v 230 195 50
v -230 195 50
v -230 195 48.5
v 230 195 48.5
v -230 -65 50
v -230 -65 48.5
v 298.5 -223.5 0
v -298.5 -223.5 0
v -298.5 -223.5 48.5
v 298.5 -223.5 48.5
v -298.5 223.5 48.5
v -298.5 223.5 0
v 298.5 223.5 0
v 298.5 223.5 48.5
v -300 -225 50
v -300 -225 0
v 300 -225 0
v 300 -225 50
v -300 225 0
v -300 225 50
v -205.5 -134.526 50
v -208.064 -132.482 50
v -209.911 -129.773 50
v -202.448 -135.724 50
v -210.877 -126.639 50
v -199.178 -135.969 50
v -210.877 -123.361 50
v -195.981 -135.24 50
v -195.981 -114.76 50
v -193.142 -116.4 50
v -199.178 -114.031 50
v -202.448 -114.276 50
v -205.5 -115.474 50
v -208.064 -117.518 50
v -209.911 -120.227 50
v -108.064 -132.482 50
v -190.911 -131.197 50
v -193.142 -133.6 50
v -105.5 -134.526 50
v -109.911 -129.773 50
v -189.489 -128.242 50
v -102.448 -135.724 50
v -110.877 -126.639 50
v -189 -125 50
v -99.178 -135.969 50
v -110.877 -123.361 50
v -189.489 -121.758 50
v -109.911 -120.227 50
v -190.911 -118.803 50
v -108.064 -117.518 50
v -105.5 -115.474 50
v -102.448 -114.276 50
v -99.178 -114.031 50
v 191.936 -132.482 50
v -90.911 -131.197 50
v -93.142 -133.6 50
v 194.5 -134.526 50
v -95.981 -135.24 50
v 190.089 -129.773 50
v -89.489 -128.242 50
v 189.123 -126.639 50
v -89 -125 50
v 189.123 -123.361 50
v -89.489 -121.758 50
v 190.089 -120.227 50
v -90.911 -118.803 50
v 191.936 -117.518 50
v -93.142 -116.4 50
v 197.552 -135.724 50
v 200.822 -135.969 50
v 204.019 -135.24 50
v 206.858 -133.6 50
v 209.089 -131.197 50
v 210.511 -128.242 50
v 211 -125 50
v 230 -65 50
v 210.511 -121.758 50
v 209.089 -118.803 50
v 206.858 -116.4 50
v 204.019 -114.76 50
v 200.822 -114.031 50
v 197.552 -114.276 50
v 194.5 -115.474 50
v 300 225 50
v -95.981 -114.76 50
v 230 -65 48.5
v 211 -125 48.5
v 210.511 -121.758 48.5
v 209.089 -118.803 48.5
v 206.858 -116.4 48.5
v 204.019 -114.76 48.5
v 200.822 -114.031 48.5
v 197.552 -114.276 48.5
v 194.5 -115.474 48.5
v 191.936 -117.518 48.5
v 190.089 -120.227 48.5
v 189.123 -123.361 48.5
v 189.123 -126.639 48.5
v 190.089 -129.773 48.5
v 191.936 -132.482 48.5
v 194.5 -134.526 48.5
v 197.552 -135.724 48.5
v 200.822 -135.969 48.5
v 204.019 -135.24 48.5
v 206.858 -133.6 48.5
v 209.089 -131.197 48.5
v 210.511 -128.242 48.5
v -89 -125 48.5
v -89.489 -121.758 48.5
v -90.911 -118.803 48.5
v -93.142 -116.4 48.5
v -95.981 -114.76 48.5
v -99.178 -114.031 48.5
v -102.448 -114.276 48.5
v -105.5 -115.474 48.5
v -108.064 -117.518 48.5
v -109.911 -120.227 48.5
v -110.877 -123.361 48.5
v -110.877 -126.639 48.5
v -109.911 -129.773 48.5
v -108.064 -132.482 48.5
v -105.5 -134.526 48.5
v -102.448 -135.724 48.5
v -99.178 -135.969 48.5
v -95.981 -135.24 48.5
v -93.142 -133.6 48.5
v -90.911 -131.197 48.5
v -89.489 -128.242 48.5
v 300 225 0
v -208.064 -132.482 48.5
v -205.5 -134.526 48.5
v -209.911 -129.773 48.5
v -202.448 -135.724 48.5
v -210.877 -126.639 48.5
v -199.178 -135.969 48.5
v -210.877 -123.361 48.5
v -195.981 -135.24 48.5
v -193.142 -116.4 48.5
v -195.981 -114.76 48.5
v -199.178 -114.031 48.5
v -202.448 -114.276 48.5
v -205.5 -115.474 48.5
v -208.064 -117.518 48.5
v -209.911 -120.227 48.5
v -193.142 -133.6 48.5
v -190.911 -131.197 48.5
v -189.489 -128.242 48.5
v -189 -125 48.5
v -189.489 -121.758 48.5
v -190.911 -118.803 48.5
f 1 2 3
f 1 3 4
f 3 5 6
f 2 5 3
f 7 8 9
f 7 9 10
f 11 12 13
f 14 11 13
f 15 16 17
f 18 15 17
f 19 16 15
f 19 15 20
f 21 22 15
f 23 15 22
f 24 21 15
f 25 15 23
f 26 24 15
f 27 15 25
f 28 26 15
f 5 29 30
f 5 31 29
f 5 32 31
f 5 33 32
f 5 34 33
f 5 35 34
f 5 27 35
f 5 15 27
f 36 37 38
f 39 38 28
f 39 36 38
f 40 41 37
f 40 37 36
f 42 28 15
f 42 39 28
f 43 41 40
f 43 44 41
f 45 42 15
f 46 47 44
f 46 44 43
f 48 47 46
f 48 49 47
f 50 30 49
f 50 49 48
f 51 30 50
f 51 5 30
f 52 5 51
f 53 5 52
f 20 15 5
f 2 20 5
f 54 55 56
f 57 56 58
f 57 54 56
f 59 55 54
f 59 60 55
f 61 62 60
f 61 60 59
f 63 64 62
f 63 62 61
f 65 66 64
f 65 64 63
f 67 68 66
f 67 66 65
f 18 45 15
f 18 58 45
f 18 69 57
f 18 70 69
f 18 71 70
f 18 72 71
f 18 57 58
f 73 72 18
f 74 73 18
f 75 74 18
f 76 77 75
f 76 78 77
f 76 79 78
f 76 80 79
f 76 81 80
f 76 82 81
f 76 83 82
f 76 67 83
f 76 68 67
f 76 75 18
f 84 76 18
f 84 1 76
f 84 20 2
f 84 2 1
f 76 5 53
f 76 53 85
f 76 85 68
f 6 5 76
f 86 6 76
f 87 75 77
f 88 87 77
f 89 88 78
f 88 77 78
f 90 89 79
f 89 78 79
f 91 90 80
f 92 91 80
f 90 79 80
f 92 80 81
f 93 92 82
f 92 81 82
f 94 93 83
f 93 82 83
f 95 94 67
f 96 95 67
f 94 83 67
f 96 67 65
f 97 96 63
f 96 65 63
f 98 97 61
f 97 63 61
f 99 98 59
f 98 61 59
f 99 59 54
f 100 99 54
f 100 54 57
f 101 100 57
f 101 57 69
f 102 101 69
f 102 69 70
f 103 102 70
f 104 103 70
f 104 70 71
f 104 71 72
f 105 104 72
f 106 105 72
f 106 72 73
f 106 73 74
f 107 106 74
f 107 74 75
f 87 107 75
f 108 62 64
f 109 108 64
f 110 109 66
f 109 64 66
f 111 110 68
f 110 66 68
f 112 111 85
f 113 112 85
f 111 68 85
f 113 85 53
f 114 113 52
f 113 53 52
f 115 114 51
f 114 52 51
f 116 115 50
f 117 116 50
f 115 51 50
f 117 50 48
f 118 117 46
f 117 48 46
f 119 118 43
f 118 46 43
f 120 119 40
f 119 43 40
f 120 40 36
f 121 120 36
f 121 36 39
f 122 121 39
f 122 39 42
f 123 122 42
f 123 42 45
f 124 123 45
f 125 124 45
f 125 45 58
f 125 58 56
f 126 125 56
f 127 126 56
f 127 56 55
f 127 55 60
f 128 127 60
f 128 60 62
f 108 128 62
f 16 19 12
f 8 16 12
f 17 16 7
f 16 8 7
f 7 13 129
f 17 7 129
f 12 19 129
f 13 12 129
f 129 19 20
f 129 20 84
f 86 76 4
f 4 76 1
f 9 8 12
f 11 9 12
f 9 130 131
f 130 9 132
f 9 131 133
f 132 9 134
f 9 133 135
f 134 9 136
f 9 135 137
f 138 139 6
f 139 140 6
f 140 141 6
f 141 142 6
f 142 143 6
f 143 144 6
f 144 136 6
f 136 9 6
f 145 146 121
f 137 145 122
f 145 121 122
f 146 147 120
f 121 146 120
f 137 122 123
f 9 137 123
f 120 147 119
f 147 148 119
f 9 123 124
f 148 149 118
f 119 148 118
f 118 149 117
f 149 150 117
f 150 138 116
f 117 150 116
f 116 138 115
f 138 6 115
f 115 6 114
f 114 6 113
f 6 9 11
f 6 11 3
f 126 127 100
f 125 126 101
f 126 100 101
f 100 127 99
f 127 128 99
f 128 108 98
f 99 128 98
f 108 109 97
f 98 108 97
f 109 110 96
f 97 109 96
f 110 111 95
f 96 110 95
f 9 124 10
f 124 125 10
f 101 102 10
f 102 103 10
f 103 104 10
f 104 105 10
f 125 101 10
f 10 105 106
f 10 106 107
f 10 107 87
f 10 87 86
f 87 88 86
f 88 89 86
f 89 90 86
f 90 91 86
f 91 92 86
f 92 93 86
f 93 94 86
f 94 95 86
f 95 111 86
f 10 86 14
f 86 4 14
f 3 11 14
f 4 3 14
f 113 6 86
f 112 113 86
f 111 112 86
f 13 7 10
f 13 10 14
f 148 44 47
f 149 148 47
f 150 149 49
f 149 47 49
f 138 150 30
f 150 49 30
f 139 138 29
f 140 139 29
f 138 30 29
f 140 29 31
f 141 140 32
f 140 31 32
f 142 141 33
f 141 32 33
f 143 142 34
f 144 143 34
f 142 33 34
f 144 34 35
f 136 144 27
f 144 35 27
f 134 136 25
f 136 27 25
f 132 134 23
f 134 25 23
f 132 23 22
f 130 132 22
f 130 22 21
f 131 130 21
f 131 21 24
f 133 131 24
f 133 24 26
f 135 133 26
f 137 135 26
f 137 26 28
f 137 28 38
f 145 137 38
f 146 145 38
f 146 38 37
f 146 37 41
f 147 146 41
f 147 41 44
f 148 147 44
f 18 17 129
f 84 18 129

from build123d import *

# Parameters (mm, degrees)
SKETCH1_W           = 600
SKETCH1_H           = 450
BOSS_EXTRUDE1_DEPTH = 50
SHELL1_T            = -1.5
CUT_EXTRUDE1_REACH  = 52
SKETCH3_W           = 460
SKETCH3_H           = 260
CUT_EXTRUDE2_REACH  = 52
SKETCH4_R           = 11


with BuildPart() as part:
    # Sketch1 → Boss-Extrude1 (new body)
    with BuildSketch(Plane.XY):
        Rectangle(SKETCH1_W, SKETCH1_H)
    extrude(amount=BOSS_EXTRUDE1_DEPTH)

    # Shell1
    shell1_openings = [part.faces().sort_by_distance(p)[0] for p in [
        (0, 0, 0),
    ]]
    offset(amount=SHELL1_T, openings=shell1_openings, kind=Kind.INTERSECTION)

    # Sketch3 → Cut-Extrude1 (cut, up to next)
    with BuildSketch(Plane.XY.offset(50), mode=Mode.PRIVATE) as cut_extrude1_sk1:
        with Locations((0, 65)):
            Rectangle(SKETCH3_W, SKETCH3_H)
    cut_extrude1_tool1 = extrude(cut_extrude1_sk1.sketch, amount=-CUT_EXTRUDE1_REACH, mode=Mode.PRIVATE) & part.part
    add(cut_extrude1_tool1.solids().sort_by_distance((0, 65, 50))[0], mode=Mode.SUBTRACT)

    # Sketch4 → Cut-Extrude2 (cut, up to next)
    with BuildSketch(Plane.XY.offset(50), mode=Mode.PRIVATE) as cut_extrude2_sk1:
        with Locations((-200, -125)):
            Circle(SKETCH4_R)
    cut_extrude2_tool1 = extrude(cut_extrude2_sk1.sketch, amount=-CUT_EXTRUDE2_REACH, mode=Mode.PRIVATE) & part.part
    add(cut_extrude2_tool1.solids().sort_by_distance((-200, -125, 50))[0], mode=Mode.SUBTRACT)
    # Sketch4 → Cut-Extrude2 (cut, up to next)
    with BuildSketch(Plane.XY.offset(50), mode=Mode.PRIVATE) as cut_extrude2_sk2:
        with Locations((200, -125)):
            Circle(SKETCH4_R)
    cut_extrude2_tool2 = extrude(cut_extrude2_sk2.sketch, amount=-CUT_EXTRUDE2_REACH, mode=Mode.PRIVATE) & part.part
    add(cut_extrude2_tool2.solids().sort_by_distance((200, -125, 50))[0], mode=Mode.SUBTRACT)
    # Sketch4 → Cut-Extrude2 (cut, up to next)
    with BuildSketch(Plane.XY.offset(50), mode=Mode.PRIVATE) as cut_extrude2_sk3:
        with Locations((-100, -125)):
            Circle(SKETCH4_R)
    cut_extrude2_tool3 = extrude(cut_extrude2_sk3.sketch, amount=-CUT_EXTRUDE2_REACH, mode=Mode.PRIVATE) & part.part
    add(cut_extrude2_tool3.solids().sort_by_distance((-100, -125, 50))[0], mode=Mode.SUBTRACT)


solid = part.part
